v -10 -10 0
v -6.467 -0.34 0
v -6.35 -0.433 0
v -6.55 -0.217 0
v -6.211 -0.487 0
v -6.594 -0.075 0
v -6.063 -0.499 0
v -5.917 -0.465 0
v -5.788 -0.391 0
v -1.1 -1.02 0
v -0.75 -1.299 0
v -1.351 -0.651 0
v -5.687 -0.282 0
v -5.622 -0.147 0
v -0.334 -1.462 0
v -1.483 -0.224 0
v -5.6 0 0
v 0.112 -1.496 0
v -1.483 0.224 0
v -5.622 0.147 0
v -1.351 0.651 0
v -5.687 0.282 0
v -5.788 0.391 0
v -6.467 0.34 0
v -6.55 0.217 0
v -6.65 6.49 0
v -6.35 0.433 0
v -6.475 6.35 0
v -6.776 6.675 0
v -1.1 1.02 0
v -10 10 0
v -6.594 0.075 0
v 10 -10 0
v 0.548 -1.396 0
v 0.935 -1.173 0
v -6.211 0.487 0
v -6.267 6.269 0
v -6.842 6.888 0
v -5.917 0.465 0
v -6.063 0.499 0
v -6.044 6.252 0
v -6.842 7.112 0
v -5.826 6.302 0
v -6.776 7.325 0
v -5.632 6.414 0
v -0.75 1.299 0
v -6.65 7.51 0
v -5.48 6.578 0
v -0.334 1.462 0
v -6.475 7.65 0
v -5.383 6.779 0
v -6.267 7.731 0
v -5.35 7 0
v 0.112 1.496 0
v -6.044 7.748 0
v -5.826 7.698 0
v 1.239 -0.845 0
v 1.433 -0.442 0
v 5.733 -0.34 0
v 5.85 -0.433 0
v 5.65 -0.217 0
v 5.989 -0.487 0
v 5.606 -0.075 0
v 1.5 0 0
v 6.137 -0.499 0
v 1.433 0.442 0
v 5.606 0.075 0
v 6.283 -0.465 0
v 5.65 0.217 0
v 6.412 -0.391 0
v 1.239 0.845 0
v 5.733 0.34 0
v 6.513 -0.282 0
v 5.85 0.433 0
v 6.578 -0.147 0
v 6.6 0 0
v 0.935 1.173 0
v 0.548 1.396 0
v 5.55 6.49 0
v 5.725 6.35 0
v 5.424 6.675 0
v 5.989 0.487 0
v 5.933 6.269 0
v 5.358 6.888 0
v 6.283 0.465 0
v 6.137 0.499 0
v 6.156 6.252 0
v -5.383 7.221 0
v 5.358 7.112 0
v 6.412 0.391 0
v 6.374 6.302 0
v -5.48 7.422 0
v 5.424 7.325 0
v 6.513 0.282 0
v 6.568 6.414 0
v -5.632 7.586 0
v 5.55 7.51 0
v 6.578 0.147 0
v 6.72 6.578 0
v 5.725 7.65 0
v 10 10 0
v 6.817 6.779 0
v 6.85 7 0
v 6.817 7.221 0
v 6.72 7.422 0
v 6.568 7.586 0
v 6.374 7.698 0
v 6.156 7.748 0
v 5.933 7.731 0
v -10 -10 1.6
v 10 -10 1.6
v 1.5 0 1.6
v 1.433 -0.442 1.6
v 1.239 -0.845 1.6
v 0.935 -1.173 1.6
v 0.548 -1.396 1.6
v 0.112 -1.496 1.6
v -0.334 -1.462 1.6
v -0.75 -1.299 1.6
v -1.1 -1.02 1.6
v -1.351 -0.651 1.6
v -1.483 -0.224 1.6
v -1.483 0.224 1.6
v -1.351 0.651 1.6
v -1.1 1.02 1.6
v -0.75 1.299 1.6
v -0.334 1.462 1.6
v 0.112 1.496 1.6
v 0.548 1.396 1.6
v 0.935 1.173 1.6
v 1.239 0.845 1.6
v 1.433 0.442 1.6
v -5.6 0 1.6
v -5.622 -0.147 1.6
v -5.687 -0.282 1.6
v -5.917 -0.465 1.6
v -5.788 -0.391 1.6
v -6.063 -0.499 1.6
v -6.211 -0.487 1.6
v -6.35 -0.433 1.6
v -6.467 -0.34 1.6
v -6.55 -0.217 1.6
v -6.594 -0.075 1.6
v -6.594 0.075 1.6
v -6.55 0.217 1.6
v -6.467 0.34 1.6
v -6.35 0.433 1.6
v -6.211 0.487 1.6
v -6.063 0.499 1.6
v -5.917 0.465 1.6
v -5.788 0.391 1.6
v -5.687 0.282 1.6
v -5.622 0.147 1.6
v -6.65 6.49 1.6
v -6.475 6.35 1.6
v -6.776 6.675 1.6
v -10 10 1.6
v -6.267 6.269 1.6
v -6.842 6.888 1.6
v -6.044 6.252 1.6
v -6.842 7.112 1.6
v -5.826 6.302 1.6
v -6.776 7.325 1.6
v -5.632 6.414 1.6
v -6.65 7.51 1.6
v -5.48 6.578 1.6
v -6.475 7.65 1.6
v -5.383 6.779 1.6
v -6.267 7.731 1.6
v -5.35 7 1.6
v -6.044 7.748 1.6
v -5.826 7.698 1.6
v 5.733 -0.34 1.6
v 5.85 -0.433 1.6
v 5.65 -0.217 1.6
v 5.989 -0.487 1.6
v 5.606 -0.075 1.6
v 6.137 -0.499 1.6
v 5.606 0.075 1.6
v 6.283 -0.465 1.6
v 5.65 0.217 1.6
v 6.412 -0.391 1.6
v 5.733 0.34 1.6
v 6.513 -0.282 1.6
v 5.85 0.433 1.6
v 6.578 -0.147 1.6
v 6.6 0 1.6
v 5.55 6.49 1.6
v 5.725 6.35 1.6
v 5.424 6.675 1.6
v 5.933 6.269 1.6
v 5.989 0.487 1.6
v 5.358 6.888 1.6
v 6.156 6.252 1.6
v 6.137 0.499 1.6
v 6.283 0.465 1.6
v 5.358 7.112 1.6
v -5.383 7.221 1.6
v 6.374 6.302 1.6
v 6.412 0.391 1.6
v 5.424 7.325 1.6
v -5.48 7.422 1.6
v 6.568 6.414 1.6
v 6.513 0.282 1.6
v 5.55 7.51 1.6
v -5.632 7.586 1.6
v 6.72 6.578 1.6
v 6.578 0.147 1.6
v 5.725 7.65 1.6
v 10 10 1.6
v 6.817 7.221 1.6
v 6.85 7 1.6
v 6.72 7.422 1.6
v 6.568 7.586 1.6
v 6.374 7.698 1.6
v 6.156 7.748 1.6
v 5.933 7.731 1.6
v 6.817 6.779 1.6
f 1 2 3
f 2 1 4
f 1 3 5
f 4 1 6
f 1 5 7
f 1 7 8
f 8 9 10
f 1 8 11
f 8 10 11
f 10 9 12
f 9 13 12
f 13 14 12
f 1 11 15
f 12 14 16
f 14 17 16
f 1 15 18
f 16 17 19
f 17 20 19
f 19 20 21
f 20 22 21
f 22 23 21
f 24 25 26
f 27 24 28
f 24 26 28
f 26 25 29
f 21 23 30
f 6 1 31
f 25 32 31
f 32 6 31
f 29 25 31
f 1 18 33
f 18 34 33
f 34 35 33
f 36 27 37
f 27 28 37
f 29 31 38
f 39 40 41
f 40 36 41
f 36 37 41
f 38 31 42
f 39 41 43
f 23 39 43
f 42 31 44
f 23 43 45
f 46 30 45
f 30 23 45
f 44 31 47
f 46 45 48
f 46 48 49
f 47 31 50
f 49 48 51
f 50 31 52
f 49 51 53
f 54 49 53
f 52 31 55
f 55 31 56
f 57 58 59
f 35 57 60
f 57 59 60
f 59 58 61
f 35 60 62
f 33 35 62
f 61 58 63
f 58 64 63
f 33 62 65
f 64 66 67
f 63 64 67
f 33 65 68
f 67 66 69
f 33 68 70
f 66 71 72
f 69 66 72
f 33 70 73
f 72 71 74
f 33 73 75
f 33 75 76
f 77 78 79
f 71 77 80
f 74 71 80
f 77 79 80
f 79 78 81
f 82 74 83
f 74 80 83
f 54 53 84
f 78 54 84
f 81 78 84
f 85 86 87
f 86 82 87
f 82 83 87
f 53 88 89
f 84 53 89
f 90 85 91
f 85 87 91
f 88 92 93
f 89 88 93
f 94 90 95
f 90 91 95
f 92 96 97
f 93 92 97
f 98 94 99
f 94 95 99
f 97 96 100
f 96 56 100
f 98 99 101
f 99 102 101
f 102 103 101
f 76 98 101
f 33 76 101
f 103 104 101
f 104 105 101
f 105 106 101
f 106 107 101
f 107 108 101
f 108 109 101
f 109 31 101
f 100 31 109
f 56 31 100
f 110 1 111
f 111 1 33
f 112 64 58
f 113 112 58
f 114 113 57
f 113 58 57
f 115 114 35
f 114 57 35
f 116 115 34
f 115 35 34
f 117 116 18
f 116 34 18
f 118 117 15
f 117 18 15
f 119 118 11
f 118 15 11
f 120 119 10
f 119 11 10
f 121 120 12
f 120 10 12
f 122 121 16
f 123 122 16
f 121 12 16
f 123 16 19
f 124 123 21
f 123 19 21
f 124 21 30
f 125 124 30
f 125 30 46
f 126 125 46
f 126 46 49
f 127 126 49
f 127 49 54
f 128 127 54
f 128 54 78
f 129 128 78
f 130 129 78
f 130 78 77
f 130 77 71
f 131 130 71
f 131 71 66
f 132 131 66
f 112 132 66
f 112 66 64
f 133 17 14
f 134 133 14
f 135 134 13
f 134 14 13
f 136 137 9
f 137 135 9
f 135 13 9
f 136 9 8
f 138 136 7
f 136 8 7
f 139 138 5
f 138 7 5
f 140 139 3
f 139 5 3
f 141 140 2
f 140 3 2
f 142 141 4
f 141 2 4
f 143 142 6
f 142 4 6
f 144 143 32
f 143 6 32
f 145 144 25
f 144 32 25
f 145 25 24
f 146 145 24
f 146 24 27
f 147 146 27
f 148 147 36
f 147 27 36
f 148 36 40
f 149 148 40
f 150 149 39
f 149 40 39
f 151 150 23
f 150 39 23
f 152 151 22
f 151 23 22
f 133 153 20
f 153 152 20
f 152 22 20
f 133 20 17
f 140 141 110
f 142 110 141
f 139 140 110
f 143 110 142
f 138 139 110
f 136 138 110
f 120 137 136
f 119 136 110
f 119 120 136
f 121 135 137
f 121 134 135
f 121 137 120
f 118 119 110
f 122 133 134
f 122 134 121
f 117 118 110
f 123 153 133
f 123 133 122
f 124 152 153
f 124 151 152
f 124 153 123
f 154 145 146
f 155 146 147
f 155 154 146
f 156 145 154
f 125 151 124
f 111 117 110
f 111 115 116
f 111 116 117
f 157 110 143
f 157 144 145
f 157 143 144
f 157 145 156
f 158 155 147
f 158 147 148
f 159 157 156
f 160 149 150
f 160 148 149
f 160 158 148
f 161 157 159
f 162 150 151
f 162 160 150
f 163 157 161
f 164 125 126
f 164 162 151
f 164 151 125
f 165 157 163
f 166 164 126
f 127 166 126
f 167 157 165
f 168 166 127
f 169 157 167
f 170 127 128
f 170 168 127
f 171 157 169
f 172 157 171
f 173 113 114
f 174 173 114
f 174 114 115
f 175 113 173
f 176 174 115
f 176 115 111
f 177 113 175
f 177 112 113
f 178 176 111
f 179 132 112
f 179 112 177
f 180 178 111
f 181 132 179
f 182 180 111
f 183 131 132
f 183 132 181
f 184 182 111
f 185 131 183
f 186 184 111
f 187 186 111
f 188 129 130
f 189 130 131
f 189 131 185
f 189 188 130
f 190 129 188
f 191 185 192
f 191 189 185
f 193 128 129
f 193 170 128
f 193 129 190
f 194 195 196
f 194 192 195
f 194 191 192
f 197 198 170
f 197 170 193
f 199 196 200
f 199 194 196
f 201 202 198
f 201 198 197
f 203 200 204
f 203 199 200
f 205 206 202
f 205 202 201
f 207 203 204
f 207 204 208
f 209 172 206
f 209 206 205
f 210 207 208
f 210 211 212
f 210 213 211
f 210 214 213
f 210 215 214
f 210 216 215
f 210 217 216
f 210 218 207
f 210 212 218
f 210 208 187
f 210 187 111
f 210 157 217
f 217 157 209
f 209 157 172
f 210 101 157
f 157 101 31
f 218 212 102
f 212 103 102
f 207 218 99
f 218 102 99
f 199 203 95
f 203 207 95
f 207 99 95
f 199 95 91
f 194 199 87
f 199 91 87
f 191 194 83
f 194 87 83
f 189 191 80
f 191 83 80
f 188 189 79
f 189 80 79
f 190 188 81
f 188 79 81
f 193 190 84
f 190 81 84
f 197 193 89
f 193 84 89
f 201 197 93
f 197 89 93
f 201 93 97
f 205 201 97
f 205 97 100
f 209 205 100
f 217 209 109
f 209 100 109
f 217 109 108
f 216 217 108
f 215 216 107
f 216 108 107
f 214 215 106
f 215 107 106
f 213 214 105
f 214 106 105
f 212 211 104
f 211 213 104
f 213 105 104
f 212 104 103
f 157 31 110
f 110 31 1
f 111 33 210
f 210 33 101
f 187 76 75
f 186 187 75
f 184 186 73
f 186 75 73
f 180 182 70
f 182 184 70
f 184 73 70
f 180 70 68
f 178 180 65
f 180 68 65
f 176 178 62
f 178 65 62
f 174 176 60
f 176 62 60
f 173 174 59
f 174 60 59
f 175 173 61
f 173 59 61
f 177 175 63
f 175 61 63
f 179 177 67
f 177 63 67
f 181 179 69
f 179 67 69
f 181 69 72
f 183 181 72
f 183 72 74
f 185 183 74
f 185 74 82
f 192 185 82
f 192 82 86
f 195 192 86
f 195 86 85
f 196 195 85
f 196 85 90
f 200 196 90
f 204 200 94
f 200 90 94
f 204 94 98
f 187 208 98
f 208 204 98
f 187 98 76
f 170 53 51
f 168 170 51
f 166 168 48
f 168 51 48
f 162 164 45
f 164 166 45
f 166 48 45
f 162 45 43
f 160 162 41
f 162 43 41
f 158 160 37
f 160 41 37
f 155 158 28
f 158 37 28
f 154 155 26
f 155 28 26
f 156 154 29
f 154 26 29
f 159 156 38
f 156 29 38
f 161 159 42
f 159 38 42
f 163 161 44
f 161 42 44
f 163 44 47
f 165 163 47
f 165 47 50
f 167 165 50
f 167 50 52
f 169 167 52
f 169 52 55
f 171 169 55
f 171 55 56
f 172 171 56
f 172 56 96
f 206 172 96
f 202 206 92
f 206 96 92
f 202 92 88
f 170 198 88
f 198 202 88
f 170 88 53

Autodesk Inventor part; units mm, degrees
sketch "スケッチ1" plane through (0, 0, 0) normal (0, 0, 1) x (1, 0, 0)
  line L0 (-10, -10) -> (10, -10)
  line L1 (10, -10) -> (10, 10)
  line L2 (10, 10) -> (-10, 10)
  line L3 (-10, 10) -> (-10, -10)
  line L4 (-10, -10) -> (10, 10) construction
  line L5 (10, -10) -> (-10, 10) construction
  point P0 (0, 0)
  dimension "d0" = 20
  dimension "d1" = 20
extrude "押し出し1" add sketch "スケッチ1" along normal blind 1.6
sketch "スケッチ2" plane through (0, 0, 0) normal (0, 0, 1) x (1, 0, 0)
  circle A0 centre (-6.1, 7) radius 0.75
  circle A1 centre (6.1, 7) radius 0.75
  point P0 (0, 0)
  dimension "d9" = 1.5
  dimension "d10" = 7
  dimension "d11" = 6.1
  dimension "d14" = 1.5
  dimension "d15" = 12.2
extrude "押し出し2" cut sketch "スケッチ2" along normal blind 1.6
sketch "スケッチ3" plane through (0, 0, 0) normal (0, 0, 1) x (1, 0, 0)
  circle A0 centre (-6.1, 0) radius 0.5
  circle A1 centre (6.1, 0) radius 0.5
  point P0 (0, 0)
  dimension "d16" = 1
  dimension "d17" = 6.1
  dimension "d18" = 1
  dimension "d19" = 6.1
extrude "押し出し3" cut sketch "スケッチ3" along normal blind 1.6
sketch "スケッチ4" plane through (0, 0, 0) normal (0, 0, 1) x (1, 0, 0)
  circle A0 centre (0, 0) radius 1.5
  dimension "d22" = 3
extrude "押し出し4" cut sketch "スケッチ4" along normal blind 3
equation "\"d23\" = d22"
properties part number "HbBatteryPcb02" material "ABS プラスチック"
